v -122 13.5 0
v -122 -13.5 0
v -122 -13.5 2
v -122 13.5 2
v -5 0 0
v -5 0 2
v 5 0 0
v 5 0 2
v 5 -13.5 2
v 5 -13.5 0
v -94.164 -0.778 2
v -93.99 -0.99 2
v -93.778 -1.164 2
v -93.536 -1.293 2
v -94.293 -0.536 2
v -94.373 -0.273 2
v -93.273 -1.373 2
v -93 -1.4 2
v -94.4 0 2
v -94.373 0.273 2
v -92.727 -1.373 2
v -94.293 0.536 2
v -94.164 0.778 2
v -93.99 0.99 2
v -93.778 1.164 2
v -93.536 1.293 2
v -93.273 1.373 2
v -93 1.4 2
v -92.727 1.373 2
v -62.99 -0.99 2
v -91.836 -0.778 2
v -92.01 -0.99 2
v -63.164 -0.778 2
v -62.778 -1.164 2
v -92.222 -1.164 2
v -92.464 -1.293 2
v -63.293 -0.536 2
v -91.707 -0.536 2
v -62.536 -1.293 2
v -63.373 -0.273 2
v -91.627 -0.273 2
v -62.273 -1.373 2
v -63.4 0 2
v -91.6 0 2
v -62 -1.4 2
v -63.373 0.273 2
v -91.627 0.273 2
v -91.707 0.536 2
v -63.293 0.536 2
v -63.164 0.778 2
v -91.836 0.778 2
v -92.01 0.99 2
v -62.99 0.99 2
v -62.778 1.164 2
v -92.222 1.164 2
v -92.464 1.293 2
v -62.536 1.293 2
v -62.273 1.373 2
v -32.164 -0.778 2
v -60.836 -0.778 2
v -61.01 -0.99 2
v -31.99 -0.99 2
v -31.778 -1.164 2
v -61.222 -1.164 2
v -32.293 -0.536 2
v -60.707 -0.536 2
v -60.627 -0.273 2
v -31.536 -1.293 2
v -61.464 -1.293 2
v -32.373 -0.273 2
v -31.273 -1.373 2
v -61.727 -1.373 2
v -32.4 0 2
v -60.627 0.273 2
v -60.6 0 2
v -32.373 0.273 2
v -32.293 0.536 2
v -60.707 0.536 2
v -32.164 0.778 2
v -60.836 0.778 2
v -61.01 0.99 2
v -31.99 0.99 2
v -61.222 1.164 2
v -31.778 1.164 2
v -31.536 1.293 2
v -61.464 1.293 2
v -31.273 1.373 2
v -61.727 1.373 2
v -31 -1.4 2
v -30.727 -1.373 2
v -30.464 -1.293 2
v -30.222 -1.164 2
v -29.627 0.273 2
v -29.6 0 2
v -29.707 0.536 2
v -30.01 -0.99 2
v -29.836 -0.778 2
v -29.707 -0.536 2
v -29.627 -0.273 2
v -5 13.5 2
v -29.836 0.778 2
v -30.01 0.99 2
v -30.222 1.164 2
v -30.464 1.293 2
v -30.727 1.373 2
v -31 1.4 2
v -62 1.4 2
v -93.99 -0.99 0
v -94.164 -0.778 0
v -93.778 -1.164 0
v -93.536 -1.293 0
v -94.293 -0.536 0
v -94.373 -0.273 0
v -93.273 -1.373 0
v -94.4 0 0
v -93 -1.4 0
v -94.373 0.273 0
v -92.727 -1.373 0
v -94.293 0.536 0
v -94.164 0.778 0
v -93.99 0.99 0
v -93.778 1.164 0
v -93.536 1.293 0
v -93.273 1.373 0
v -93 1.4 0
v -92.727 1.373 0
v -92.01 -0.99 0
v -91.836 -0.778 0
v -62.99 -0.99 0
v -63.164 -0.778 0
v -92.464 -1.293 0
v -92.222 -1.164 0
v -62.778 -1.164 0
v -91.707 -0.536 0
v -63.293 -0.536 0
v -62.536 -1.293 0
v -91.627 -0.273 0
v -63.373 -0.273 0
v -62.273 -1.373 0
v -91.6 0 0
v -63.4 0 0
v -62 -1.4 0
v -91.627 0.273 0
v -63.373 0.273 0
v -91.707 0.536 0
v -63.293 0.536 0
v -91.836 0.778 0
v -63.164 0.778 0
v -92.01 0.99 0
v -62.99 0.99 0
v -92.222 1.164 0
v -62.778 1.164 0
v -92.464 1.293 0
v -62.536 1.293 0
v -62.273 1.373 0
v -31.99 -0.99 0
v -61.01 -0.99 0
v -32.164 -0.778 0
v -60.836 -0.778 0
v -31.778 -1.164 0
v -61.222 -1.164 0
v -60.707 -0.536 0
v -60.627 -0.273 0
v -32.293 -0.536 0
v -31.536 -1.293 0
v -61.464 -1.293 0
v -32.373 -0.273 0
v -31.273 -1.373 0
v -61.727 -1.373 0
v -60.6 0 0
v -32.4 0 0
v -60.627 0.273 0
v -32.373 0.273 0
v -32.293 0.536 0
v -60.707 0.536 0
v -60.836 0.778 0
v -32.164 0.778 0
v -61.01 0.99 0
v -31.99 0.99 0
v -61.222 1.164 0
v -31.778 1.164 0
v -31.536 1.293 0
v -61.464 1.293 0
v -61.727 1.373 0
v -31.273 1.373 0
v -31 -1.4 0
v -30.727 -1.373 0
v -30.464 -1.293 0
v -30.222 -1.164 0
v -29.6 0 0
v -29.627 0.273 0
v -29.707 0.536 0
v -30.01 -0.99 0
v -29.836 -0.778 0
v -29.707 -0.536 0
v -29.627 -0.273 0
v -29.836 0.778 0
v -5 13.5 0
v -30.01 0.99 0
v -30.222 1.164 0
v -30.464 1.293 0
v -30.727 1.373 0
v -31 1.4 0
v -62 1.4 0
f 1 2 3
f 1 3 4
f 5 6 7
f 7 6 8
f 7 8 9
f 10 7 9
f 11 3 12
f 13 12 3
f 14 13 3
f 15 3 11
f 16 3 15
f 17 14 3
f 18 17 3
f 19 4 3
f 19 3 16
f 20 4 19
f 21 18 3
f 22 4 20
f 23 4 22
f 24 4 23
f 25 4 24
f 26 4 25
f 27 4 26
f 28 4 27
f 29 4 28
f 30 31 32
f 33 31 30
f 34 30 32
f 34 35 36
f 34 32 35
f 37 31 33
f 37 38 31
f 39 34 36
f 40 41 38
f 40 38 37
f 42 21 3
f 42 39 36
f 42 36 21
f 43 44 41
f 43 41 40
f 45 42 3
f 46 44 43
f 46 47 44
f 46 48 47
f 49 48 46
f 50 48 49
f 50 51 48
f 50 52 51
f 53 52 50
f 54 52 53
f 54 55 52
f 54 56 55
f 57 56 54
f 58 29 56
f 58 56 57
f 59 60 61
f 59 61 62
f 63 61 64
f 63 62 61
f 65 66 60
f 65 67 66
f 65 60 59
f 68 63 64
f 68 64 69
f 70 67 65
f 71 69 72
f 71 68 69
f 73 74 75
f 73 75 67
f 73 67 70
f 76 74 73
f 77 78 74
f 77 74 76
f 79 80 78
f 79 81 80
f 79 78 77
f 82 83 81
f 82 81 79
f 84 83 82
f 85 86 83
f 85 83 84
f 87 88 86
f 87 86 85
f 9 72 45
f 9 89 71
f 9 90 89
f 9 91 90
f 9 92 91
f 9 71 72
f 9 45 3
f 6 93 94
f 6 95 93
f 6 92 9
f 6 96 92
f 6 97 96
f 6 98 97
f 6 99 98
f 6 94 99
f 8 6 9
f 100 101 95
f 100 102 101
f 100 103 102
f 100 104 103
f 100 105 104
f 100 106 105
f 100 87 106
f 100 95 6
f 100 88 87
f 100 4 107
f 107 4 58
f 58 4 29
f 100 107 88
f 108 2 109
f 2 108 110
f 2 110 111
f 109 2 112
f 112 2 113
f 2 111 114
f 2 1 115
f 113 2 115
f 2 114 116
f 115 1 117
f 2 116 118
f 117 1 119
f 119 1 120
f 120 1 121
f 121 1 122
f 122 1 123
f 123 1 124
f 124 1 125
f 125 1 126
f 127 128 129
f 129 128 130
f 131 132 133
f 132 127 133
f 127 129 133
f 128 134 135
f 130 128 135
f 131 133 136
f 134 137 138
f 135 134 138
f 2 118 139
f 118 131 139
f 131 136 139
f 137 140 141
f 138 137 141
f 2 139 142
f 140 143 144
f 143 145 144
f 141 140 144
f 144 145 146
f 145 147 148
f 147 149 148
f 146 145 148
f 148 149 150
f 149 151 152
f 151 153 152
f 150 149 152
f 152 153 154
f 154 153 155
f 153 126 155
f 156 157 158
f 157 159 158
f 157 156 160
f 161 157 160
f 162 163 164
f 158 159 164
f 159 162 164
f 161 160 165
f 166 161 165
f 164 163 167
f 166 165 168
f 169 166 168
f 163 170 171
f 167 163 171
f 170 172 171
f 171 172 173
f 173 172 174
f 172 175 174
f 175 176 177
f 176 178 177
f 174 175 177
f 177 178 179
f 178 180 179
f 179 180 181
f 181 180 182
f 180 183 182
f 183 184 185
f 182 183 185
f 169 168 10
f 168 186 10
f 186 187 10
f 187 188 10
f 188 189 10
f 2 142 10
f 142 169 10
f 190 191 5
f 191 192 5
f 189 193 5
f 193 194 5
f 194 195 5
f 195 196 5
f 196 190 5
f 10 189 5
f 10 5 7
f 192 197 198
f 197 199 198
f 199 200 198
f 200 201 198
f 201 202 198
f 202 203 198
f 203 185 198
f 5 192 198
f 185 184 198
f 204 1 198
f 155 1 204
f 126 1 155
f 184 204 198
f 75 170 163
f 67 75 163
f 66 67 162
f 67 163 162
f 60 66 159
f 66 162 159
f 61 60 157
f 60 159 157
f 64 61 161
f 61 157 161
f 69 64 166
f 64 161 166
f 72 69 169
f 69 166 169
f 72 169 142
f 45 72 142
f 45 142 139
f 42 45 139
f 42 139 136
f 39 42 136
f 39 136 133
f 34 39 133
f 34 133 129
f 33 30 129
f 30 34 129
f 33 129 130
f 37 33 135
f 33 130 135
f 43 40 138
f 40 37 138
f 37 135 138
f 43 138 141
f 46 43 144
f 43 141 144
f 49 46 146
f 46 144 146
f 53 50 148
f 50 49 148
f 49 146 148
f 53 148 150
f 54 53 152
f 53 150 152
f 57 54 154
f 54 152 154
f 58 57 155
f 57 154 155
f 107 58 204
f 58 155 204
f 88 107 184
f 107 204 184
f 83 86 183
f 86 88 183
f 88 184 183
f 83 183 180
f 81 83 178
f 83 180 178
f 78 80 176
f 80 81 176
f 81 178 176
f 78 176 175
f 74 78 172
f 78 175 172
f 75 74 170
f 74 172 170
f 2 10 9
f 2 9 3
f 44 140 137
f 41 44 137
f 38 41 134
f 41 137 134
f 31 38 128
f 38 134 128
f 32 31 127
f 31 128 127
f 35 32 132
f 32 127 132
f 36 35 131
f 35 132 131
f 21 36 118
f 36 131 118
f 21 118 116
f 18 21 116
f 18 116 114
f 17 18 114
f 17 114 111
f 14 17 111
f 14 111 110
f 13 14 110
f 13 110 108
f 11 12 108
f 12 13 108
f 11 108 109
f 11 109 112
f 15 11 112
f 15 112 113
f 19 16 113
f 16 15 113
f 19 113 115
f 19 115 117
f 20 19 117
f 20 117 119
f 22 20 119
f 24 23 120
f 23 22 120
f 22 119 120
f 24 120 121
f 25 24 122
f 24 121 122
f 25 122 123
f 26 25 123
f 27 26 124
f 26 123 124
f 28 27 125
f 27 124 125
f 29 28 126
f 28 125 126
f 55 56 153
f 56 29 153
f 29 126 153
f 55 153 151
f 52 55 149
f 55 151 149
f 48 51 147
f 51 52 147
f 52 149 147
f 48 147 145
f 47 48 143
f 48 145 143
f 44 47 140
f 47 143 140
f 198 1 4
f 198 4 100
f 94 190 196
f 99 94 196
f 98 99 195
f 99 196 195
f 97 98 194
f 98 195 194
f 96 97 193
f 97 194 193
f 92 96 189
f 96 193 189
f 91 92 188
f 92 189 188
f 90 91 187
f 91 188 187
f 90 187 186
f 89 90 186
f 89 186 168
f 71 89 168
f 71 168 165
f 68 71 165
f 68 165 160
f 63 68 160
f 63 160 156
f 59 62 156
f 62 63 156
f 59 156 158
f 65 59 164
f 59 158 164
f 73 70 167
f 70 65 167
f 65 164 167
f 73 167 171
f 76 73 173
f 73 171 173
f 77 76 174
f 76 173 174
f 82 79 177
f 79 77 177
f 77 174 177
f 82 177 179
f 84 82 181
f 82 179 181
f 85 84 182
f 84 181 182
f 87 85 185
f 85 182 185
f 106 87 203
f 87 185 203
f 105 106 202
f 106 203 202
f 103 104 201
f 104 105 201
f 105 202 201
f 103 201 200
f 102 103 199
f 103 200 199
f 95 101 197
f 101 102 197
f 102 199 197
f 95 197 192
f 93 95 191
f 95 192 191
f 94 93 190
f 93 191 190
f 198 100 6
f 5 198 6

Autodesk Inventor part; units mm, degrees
ref_plane "YZ Plane" through (0, 0, 0) normal (1, 0, 0) x (0, 1, 0)
ref_plane "XZ Plane" through (0, 0, 0) normal (0, 1, 0) x (-1, 0, 0)
ref_plane "XY Plane" through (0, 0, 0) normal (0, 0, 1) x (1, 0, 0)
sketch "Sketch1" plane through (0, 0, 0) normal (0, 0, 1) x (1, 0, 0)
  line L0 (122, -13.5) -> (-122, -13.5)
  line L1 (-122, -13.5) -> (-122, 13.5)
  line L2 (-122, 13.5) -> (122, 13.5)
  line L3 (122, 13.5) -> (122, -13.5)
  line L4 (122, -13.5) -> (-122, 13.5) construction
  line L5 (-122, -13.5) -> (122, 13.5) construction
  line L6 (0, 0) -> (-31, 0) construction
  circle A0 centre (-93, 0) radius 1.4
  circle A1 centre (-62, 0) radius 1.4
  circle A2 centre (-31, 0) radius 1.4
  circle A3 centre (0, 0) radius 1.4
  circle A4 centre (31, 0) radius 1.4
  circle A5 centre (62, 0) radius 1.4
  circle A6 centre (93, 0) radius 1.4
  dimension "d0" = 27
  dimension "d1" = 244
  dimension "d2" = 2.8
  dimension "d5" = 31
  dimension "d10" = 31
extrude "Extrusion1" add sketch "Sketch1" along normal blind 2 contours L0 L1 L2 L3 | A3
sketch "Sketch2" plane through (0, 0, 2) normal (0, 0, 1) x (1, 0, 0)
  line L0 (-5, 99.1699) -> (-5, 0)
  line L1 (-5, 0) -> (5, 0)
  line L2 (5, 0) -> (5, -99.1699)
  line L3 (232.2267, -99.1699) -> (-232.2267, -99.1699)
  line L4 (-232.2267, -99.1699) -> (-232.2267, 99.1699)
  line L5 (-232.2267, 99.1699) -> (232.2267, 99.1699)
  line L6 (232.2267, 99.1699) -> (232.2267, -99.1699)
  line L7 (232.2267, -99.1699) -> (-232.2267, 99.1699) construction
  line L8 (-232.2267, -99.1699) -> (232.2267, 99.1699) construction
  point P0 (0, 0)
  dimension "d13" = 10
extrude "Extrusion2" cut sketch "Sketch2" against normal through all contours L5 L6 L3 L2 L1 L0
properties part number "SensorLid"
